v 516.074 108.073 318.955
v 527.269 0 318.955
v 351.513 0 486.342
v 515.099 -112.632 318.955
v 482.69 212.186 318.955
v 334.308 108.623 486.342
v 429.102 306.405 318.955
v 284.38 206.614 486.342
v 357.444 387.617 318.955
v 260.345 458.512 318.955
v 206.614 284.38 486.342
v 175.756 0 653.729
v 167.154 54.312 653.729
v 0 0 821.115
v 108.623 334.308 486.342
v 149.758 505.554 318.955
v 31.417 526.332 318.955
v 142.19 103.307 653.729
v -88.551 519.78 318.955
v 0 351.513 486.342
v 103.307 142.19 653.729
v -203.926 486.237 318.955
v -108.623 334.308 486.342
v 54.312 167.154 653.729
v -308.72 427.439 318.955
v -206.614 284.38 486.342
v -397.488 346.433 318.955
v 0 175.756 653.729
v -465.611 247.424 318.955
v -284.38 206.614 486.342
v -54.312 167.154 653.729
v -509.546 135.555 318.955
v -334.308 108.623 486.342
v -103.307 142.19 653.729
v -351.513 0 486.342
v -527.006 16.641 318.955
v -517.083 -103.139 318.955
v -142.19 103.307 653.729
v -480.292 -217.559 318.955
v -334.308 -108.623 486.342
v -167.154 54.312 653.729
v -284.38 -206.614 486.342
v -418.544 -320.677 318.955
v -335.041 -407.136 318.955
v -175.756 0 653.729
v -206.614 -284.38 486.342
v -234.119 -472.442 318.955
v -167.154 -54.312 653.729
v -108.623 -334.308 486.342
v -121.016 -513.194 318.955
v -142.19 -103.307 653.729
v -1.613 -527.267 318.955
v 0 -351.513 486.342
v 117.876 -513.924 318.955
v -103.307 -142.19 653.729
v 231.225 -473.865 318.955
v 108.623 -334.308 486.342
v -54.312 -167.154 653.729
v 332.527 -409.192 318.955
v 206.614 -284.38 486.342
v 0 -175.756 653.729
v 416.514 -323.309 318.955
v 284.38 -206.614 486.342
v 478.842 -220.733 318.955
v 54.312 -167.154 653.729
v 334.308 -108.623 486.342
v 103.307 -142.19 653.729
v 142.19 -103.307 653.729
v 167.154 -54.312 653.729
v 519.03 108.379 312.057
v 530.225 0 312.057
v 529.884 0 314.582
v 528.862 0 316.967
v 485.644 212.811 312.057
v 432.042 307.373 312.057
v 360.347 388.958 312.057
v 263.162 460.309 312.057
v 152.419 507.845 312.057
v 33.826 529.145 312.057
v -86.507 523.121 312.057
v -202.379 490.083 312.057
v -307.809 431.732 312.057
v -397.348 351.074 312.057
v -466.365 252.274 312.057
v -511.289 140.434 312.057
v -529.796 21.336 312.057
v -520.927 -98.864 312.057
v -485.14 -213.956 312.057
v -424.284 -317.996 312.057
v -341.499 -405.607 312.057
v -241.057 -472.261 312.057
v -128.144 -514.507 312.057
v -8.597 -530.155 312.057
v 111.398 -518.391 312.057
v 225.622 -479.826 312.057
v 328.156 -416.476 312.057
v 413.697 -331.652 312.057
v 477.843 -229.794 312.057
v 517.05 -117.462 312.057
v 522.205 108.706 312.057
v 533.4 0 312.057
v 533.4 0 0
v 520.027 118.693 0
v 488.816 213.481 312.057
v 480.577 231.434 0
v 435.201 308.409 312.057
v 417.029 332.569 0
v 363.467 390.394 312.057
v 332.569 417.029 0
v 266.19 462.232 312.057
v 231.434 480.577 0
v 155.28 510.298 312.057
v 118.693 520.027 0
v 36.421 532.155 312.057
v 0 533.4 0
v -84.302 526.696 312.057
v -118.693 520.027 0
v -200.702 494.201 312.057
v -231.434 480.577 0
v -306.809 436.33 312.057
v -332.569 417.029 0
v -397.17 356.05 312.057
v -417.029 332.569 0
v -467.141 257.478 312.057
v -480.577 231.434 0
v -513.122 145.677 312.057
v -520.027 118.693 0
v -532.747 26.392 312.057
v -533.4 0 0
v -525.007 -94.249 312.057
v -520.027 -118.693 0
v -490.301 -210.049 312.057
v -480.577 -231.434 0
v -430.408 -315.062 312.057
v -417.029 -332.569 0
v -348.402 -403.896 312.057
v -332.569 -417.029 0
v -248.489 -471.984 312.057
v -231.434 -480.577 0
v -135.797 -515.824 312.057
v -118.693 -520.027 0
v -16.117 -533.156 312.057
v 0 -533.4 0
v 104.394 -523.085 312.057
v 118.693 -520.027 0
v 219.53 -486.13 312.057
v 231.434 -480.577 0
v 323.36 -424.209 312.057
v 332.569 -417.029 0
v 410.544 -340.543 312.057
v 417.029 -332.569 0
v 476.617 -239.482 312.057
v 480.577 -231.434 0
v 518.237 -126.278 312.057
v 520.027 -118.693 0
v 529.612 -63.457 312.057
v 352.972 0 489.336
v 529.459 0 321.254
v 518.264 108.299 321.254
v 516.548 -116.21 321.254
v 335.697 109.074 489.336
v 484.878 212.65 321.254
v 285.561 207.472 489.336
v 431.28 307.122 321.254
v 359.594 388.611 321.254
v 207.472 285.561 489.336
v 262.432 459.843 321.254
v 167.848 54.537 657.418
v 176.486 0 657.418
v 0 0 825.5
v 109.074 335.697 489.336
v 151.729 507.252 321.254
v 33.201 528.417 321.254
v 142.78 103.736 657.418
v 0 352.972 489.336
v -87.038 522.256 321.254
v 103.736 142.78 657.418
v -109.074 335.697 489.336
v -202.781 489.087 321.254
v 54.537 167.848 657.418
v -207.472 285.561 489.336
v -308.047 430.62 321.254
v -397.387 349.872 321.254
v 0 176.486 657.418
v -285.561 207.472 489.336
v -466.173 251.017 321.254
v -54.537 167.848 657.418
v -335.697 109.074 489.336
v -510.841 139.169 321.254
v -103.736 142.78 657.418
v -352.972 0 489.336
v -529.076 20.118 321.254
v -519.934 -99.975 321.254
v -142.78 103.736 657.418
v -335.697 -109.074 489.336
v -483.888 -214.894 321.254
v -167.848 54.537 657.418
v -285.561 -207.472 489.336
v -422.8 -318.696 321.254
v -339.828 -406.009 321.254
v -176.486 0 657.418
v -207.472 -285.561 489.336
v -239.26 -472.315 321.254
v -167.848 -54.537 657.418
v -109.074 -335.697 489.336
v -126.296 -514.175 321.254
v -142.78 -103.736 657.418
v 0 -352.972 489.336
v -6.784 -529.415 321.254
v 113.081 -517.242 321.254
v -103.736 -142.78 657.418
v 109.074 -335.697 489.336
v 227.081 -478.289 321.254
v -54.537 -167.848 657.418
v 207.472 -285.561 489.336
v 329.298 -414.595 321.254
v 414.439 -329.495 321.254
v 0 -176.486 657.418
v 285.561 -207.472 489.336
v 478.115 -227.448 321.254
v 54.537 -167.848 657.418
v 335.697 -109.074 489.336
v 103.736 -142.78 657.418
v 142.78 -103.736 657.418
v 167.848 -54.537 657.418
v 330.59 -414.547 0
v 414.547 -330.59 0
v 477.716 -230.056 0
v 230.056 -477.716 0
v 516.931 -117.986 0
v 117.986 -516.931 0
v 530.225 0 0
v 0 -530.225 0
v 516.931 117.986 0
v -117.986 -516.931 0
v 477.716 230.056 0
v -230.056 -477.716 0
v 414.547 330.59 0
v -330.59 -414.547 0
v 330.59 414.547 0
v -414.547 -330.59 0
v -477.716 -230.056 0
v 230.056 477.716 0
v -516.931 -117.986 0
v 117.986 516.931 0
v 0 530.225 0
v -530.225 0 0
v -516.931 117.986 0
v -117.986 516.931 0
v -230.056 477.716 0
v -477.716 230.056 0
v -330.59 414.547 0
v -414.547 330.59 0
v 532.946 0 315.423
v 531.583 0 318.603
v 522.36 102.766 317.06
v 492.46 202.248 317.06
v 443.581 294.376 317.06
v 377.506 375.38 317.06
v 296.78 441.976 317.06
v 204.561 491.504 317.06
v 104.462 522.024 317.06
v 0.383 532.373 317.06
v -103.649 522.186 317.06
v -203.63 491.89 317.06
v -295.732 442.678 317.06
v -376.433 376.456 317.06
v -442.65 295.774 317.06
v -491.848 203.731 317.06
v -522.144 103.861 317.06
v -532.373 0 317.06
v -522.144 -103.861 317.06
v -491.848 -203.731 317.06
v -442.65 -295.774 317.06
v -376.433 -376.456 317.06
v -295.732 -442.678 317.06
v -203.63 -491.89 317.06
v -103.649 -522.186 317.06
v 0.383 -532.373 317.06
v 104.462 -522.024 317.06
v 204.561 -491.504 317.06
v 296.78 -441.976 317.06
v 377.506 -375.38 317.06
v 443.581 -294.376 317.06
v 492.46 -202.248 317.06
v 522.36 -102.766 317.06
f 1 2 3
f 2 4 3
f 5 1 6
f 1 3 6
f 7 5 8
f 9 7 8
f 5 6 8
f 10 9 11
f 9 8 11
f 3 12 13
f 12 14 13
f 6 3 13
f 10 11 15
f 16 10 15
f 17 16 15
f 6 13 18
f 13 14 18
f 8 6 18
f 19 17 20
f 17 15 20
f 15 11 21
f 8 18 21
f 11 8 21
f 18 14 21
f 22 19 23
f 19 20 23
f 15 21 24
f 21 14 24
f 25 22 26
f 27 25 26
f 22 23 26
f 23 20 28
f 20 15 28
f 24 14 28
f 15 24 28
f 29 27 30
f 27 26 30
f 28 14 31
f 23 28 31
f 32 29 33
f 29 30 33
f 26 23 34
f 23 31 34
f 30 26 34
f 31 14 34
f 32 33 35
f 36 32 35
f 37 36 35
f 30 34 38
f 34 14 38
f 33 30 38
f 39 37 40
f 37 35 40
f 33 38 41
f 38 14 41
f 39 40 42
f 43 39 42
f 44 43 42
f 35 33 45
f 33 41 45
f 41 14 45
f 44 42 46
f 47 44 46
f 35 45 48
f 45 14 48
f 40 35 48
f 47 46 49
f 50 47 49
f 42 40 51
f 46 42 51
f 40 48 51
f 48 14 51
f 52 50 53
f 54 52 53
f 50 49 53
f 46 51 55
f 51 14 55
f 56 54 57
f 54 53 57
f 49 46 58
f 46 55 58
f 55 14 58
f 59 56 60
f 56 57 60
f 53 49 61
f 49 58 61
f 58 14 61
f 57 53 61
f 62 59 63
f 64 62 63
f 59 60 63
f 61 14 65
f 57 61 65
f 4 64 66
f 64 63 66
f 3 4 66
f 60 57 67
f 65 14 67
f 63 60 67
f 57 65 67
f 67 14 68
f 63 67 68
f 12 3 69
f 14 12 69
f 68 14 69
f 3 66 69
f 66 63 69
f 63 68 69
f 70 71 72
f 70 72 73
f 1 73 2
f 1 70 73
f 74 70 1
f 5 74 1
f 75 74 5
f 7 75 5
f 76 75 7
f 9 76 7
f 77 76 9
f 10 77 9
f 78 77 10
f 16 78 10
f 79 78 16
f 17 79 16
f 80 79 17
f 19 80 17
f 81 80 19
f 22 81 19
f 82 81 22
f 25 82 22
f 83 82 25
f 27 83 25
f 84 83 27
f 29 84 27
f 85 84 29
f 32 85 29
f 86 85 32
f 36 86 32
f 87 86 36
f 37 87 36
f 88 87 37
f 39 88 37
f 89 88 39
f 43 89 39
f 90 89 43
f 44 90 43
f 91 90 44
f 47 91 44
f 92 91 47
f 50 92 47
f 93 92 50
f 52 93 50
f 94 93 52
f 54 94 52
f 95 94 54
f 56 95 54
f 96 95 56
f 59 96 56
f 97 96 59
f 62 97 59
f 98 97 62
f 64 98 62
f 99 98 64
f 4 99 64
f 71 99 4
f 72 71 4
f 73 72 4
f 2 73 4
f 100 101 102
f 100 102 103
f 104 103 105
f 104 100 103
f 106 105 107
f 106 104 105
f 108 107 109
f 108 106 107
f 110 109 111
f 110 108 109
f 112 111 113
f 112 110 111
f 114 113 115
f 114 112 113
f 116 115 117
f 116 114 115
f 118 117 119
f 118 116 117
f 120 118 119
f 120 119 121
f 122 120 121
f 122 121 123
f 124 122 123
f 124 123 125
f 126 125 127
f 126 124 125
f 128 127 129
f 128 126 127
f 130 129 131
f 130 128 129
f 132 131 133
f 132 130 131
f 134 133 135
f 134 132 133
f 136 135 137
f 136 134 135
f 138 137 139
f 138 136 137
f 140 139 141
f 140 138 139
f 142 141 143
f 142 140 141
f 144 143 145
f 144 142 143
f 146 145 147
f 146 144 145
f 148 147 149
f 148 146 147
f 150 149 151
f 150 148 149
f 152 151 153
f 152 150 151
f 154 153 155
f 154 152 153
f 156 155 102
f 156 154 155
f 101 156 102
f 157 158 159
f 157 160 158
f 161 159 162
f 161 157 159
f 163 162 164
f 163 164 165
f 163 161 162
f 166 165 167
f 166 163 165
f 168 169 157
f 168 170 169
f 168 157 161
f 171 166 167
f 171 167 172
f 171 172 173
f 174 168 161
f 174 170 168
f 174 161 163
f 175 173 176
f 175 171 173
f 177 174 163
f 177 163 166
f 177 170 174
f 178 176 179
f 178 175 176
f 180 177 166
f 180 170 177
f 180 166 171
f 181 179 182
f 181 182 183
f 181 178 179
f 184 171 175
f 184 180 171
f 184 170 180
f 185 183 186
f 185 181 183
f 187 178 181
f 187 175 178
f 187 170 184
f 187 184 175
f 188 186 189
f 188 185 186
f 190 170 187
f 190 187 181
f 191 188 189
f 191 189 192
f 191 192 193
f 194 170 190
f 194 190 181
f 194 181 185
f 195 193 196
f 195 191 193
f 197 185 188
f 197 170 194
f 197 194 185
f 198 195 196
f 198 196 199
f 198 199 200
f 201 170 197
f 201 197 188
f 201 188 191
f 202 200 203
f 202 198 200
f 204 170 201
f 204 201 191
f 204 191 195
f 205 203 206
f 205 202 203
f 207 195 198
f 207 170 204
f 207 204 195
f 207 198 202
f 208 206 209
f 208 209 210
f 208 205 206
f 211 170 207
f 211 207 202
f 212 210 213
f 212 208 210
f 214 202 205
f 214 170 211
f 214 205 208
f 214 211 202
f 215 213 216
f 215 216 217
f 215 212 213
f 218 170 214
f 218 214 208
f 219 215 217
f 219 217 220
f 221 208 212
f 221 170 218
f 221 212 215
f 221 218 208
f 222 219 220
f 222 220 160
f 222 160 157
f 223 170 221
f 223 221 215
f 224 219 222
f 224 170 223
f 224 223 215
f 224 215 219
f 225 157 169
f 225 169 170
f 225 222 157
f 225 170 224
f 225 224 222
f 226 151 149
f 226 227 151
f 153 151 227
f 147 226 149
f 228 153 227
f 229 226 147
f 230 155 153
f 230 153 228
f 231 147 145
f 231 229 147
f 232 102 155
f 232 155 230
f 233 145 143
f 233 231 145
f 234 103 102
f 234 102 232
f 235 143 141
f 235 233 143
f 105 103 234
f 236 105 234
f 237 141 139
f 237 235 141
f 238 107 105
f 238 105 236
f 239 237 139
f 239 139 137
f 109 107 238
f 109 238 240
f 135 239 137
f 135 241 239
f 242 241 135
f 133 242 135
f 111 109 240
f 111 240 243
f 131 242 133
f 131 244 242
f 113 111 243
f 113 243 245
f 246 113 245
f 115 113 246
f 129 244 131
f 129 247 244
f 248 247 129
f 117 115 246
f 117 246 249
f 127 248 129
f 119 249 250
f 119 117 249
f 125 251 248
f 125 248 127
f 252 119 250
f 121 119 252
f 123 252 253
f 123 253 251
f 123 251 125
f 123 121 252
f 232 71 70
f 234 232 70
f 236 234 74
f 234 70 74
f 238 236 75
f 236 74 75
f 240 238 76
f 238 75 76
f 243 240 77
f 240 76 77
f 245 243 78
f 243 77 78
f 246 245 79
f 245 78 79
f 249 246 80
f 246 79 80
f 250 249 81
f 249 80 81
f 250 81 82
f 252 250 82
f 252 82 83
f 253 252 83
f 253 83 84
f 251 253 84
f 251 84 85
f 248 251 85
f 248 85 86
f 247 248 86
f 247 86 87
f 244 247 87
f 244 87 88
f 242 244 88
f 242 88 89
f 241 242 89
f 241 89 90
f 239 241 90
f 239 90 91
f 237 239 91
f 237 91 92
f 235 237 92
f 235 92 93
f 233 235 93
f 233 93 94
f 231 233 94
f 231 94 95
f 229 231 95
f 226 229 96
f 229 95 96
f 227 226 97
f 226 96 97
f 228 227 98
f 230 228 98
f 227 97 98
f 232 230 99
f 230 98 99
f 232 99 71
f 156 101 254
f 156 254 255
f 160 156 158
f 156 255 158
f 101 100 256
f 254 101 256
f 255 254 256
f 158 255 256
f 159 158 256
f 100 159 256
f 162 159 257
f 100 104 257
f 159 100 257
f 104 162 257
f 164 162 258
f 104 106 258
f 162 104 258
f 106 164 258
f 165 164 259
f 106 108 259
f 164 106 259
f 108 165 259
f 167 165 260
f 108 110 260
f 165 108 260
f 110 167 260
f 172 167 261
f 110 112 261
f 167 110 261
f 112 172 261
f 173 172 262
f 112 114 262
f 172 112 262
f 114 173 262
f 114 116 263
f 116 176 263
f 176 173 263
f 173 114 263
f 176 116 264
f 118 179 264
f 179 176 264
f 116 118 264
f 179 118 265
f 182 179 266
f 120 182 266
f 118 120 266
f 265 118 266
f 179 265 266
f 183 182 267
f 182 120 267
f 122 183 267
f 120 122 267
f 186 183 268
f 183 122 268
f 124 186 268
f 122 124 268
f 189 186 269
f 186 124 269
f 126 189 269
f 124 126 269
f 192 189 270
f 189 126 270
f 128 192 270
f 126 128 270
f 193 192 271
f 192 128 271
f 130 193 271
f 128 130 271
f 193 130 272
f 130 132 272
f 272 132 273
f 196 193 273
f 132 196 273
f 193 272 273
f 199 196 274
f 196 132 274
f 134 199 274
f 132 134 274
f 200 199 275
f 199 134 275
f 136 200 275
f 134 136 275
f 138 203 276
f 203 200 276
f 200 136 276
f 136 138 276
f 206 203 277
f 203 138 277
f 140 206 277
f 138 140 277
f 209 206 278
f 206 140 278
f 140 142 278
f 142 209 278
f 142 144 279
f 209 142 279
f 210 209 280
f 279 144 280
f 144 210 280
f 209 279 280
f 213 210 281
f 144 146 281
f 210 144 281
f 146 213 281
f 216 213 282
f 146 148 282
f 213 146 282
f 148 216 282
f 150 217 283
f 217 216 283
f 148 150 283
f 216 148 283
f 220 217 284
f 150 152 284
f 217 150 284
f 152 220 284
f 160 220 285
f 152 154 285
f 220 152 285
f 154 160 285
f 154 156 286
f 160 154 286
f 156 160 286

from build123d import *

# Parameters (mm, degrees)
F2_R = 12.7
F3_T = -3.175


with BuildPart() as f1:
    # F0 (on Front) → F1 (revolve)
    with BuildSketch(Plane.XZ):
        Polygon((0, 825.5), (0, 0), (533.4, 0), (533.4, 317.5), align=None)
    revolve(axis=Axis((0, 0, 412.75), (0, 0, 1)))

    # F2
    f2_edges = [f1.edges().sort_by_distance(p)[0] for p in [
        (-533.4, 0, 317.5),
    ]]
    fillet(f2_edges, radius=F2_R)

    # F3
    f3_openings = [f1.faces().sort_by_distance(p)[0] for p in [
        (0, 0, 0),
    ]]
    offset(amount=F3_T, openings=f3_openings)


solid = f1.part
